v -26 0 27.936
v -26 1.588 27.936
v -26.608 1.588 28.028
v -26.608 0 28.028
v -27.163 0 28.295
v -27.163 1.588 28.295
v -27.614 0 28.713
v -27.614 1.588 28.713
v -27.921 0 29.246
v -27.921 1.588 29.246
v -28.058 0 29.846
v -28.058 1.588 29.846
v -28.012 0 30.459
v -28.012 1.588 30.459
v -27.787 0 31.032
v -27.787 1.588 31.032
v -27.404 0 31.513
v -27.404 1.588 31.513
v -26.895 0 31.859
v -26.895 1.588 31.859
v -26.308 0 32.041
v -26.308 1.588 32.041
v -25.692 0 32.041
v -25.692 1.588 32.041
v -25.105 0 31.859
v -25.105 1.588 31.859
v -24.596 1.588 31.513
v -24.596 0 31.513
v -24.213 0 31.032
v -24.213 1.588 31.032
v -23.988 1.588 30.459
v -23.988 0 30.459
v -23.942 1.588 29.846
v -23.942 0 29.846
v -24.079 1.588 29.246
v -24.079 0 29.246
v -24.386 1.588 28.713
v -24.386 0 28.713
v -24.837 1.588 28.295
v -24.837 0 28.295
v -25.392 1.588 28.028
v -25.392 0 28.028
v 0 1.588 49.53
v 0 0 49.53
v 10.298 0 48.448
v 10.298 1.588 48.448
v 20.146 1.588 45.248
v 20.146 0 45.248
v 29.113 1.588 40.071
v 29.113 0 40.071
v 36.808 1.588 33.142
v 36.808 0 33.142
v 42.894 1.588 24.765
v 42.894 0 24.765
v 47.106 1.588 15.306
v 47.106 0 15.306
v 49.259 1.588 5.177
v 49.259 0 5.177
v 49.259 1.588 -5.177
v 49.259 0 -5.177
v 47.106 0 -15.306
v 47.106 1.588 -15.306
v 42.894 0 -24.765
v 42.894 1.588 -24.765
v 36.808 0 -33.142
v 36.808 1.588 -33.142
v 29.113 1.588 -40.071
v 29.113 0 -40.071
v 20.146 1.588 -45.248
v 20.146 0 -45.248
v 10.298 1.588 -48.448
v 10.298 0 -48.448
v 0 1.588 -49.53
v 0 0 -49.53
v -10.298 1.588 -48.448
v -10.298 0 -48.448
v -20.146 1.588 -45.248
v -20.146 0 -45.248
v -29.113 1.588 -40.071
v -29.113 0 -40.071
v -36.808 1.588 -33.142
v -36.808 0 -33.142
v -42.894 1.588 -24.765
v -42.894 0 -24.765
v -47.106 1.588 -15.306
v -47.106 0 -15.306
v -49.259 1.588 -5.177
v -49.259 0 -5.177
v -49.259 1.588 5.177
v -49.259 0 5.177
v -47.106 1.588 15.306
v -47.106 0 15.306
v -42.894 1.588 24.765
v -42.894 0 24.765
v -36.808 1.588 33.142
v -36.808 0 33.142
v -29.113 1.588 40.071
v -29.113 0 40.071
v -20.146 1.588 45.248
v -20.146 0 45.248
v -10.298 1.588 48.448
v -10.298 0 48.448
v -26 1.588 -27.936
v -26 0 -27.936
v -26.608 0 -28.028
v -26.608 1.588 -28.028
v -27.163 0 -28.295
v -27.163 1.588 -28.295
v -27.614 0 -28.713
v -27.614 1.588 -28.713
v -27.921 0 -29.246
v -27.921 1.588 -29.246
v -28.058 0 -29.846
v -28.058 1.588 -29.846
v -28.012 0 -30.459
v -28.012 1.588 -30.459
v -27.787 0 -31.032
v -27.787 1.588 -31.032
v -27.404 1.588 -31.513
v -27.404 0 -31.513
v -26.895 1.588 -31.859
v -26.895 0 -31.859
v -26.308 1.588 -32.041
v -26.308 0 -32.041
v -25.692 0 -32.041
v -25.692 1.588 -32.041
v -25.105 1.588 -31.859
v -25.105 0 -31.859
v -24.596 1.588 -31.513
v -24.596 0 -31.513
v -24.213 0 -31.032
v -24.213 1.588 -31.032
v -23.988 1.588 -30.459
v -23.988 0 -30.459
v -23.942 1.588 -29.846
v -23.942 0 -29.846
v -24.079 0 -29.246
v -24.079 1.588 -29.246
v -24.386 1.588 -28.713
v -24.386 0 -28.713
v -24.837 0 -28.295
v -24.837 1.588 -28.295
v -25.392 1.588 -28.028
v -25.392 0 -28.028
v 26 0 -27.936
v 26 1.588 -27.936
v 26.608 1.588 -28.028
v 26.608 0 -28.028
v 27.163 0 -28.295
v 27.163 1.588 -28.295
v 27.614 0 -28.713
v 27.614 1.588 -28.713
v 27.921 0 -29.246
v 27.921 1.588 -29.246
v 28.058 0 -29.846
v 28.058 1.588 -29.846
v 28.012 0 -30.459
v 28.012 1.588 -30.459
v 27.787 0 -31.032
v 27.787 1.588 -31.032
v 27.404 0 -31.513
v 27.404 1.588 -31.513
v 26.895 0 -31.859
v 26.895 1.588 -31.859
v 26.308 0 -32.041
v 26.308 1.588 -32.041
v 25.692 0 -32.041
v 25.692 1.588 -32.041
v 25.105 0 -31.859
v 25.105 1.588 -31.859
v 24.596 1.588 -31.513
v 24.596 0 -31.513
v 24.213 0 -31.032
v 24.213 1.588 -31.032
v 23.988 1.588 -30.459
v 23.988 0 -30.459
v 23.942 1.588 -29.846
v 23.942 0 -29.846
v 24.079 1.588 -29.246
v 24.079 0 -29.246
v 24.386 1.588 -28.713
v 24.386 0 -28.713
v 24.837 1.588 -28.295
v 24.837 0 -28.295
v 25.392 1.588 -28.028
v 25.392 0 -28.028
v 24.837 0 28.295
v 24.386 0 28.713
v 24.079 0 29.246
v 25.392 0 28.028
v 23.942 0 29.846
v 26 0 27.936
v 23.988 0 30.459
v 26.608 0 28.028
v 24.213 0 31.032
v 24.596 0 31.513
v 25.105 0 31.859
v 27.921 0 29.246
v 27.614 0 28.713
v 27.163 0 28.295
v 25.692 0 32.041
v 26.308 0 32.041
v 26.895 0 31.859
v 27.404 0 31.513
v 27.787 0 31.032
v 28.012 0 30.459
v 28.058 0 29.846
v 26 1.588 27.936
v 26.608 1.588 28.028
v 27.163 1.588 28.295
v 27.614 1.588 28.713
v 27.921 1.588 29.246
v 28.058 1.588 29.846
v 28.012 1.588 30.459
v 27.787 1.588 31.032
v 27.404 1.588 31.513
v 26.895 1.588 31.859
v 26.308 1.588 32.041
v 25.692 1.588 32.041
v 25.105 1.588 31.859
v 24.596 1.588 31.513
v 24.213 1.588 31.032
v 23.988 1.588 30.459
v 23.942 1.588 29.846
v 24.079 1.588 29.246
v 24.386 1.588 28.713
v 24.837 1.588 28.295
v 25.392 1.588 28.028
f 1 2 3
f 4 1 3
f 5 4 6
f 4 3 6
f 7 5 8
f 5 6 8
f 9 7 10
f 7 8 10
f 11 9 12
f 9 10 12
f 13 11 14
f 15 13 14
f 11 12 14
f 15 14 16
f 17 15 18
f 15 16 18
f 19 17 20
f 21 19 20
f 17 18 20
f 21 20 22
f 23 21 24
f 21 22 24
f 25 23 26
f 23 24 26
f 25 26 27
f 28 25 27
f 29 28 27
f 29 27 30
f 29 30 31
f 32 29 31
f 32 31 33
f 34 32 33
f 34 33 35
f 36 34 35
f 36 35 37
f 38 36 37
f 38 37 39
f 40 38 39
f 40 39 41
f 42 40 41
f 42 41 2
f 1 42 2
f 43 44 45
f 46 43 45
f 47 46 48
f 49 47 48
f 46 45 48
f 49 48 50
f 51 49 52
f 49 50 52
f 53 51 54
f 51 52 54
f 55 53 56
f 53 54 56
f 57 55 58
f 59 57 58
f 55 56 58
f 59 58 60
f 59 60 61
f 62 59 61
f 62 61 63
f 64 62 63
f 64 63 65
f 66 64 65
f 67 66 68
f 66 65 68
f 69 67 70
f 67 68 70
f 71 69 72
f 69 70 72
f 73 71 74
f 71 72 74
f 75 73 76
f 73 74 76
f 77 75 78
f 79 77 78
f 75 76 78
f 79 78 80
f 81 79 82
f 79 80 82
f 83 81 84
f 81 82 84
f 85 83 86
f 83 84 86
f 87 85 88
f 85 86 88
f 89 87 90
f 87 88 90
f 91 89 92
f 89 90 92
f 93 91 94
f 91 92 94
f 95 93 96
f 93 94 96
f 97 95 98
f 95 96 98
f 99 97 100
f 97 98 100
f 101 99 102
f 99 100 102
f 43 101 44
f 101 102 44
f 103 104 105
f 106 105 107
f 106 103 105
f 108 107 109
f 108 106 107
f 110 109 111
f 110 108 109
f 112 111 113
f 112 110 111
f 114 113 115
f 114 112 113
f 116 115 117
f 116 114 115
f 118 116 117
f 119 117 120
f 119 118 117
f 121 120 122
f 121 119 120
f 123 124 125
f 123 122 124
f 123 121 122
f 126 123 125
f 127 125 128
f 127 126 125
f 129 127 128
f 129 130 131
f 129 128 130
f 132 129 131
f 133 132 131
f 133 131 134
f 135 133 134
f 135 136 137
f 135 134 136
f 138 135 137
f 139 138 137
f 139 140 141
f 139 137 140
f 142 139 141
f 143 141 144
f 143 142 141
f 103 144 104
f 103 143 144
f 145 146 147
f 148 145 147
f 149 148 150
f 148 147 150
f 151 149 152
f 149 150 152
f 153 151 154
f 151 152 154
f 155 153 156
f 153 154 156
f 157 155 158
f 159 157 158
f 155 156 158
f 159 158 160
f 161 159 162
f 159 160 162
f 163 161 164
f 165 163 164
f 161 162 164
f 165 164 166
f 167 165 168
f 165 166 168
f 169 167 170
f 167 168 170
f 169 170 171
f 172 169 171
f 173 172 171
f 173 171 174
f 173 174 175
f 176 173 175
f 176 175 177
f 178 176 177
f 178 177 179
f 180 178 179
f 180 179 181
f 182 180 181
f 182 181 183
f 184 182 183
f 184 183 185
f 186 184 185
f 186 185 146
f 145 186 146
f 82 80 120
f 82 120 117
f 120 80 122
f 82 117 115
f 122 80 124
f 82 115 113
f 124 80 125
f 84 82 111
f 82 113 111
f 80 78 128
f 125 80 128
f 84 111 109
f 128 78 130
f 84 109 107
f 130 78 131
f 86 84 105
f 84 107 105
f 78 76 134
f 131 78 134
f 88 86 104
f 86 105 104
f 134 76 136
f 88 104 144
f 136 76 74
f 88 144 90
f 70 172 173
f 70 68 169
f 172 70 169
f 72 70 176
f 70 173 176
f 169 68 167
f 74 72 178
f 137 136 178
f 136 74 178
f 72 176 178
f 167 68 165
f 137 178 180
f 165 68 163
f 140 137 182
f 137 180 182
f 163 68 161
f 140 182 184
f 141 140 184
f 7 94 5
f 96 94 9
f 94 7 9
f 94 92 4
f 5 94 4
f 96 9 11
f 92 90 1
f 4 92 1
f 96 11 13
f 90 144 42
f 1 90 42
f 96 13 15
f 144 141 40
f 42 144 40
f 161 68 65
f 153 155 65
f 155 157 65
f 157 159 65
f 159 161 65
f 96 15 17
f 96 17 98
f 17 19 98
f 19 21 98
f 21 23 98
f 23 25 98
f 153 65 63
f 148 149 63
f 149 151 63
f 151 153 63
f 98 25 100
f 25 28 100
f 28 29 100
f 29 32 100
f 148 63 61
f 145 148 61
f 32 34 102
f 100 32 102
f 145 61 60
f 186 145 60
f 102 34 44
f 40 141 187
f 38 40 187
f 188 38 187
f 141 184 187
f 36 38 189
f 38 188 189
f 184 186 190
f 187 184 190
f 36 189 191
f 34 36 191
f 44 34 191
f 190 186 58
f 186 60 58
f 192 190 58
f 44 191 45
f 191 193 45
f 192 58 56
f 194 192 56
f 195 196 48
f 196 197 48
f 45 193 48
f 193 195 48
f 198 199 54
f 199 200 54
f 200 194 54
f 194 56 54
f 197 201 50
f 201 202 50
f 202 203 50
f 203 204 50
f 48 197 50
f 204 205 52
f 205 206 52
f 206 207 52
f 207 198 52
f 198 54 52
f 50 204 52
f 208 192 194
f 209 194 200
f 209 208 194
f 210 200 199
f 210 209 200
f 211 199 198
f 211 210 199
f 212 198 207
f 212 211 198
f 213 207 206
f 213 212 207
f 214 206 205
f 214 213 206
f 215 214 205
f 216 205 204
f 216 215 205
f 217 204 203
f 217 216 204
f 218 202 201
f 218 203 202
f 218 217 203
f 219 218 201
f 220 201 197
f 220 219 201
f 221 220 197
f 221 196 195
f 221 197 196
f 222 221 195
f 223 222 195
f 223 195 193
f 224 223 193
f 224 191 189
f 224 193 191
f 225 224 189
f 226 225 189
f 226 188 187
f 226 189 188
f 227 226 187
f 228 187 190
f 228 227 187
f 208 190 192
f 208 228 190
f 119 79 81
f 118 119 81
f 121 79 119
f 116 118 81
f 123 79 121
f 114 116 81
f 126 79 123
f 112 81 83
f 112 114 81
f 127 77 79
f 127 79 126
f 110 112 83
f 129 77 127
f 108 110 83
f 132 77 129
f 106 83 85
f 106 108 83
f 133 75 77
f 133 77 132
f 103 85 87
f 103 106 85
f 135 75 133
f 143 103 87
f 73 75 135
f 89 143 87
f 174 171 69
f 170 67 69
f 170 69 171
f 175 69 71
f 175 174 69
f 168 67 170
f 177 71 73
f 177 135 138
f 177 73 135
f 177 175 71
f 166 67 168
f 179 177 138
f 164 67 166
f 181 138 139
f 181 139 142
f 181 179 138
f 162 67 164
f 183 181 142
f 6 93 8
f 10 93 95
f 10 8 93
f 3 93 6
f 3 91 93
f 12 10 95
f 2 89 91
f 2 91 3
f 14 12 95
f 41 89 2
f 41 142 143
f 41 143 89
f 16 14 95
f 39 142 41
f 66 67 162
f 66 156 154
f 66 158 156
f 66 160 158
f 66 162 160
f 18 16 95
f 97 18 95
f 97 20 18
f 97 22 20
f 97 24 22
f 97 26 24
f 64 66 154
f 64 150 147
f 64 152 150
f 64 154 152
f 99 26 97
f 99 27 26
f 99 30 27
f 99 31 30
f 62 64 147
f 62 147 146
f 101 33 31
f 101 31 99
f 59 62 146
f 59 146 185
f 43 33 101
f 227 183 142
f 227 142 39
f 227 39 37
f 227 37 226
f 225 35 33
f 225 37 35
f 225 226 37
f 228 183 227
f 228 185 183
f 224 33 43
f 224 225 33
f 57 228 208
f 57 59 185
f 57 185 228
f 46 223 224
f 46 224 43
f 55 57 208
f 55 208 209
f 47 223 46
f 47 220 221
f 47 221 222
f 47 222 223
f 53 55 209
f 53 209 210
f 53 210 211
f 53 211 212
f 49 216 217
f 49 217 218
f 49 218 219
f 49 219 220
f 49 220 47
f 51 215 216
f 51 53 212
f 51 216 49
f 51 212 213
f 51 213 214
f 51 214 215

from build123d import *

# Parameters (mm, degrees)
SKETCH1_R               = 49.53
EXTRUDE1_DEPTH          = 1.5875
SKETCH2_R               = 2.06375
EXTRUDE2_DEPTH          = 10
MIRROR3_COPY_1_SKETCH_R = 2.06375
MIRROR3_COPY_1_DEPTH    = 10


with BuildPart() as part:
    # Sketch1 → Extrude1 (new body)
    with BuildSketch(Plane(origin=(0, 0, 0), x_dir=(1, 0, 0), z_dir=(0, 1, 0))):
        with Locations(Location((0, 0, 0), (0, 0, 270))):
            Circle(SKETCH1_R)
    extrude(amount=EXTRUDE1_DEPTH)

    # Sketch2 → Extrude2 (cut)
    with BuildSketch(Plane(origin=(0, 1.5875, 0), x_dir=(-1, 0, 0), z_dir=(0, 1, 0))):
        with Locations(Location((-26, -30, 0), (0, 0, 90))):
            Circle(SKETCH2_R)
    extrude2 = extrude(amount=-EXTRUDE2_DEPTH, mode=Mode.SUBTRACT)

    # Mirror1: Extrude2 across plane
    add(extrude2.mirror(Plane(origin=(0, 0, 0), x_dir=(0, 0, 1), z_dir=(1, 0, 0))), mode=Mode.SUBTRACT)

    # Mirror3: Extrude2 across plane
    add(extrude2.mirror(Plane.XY), mode=Mode.SUBTRACT)

    # Mirror3 copy 1 sketch → Mirror3 copy 1 (cut)
    with BuildSketch(Plane(origin=(0, 1.5875, 0), x_dir=(1, 0, 0), z_dir=(0, 1, 0))):
        with Locations(Location((-26, -30, 0), (0, 0, 90))):
            Circle(MIRROR3_COPY_1_SKETCH_R)
    extrude(amount=-MIRROR3_COPY_1_DEPTH, mode=Mode.SUBTRACT)


solid = part.part
